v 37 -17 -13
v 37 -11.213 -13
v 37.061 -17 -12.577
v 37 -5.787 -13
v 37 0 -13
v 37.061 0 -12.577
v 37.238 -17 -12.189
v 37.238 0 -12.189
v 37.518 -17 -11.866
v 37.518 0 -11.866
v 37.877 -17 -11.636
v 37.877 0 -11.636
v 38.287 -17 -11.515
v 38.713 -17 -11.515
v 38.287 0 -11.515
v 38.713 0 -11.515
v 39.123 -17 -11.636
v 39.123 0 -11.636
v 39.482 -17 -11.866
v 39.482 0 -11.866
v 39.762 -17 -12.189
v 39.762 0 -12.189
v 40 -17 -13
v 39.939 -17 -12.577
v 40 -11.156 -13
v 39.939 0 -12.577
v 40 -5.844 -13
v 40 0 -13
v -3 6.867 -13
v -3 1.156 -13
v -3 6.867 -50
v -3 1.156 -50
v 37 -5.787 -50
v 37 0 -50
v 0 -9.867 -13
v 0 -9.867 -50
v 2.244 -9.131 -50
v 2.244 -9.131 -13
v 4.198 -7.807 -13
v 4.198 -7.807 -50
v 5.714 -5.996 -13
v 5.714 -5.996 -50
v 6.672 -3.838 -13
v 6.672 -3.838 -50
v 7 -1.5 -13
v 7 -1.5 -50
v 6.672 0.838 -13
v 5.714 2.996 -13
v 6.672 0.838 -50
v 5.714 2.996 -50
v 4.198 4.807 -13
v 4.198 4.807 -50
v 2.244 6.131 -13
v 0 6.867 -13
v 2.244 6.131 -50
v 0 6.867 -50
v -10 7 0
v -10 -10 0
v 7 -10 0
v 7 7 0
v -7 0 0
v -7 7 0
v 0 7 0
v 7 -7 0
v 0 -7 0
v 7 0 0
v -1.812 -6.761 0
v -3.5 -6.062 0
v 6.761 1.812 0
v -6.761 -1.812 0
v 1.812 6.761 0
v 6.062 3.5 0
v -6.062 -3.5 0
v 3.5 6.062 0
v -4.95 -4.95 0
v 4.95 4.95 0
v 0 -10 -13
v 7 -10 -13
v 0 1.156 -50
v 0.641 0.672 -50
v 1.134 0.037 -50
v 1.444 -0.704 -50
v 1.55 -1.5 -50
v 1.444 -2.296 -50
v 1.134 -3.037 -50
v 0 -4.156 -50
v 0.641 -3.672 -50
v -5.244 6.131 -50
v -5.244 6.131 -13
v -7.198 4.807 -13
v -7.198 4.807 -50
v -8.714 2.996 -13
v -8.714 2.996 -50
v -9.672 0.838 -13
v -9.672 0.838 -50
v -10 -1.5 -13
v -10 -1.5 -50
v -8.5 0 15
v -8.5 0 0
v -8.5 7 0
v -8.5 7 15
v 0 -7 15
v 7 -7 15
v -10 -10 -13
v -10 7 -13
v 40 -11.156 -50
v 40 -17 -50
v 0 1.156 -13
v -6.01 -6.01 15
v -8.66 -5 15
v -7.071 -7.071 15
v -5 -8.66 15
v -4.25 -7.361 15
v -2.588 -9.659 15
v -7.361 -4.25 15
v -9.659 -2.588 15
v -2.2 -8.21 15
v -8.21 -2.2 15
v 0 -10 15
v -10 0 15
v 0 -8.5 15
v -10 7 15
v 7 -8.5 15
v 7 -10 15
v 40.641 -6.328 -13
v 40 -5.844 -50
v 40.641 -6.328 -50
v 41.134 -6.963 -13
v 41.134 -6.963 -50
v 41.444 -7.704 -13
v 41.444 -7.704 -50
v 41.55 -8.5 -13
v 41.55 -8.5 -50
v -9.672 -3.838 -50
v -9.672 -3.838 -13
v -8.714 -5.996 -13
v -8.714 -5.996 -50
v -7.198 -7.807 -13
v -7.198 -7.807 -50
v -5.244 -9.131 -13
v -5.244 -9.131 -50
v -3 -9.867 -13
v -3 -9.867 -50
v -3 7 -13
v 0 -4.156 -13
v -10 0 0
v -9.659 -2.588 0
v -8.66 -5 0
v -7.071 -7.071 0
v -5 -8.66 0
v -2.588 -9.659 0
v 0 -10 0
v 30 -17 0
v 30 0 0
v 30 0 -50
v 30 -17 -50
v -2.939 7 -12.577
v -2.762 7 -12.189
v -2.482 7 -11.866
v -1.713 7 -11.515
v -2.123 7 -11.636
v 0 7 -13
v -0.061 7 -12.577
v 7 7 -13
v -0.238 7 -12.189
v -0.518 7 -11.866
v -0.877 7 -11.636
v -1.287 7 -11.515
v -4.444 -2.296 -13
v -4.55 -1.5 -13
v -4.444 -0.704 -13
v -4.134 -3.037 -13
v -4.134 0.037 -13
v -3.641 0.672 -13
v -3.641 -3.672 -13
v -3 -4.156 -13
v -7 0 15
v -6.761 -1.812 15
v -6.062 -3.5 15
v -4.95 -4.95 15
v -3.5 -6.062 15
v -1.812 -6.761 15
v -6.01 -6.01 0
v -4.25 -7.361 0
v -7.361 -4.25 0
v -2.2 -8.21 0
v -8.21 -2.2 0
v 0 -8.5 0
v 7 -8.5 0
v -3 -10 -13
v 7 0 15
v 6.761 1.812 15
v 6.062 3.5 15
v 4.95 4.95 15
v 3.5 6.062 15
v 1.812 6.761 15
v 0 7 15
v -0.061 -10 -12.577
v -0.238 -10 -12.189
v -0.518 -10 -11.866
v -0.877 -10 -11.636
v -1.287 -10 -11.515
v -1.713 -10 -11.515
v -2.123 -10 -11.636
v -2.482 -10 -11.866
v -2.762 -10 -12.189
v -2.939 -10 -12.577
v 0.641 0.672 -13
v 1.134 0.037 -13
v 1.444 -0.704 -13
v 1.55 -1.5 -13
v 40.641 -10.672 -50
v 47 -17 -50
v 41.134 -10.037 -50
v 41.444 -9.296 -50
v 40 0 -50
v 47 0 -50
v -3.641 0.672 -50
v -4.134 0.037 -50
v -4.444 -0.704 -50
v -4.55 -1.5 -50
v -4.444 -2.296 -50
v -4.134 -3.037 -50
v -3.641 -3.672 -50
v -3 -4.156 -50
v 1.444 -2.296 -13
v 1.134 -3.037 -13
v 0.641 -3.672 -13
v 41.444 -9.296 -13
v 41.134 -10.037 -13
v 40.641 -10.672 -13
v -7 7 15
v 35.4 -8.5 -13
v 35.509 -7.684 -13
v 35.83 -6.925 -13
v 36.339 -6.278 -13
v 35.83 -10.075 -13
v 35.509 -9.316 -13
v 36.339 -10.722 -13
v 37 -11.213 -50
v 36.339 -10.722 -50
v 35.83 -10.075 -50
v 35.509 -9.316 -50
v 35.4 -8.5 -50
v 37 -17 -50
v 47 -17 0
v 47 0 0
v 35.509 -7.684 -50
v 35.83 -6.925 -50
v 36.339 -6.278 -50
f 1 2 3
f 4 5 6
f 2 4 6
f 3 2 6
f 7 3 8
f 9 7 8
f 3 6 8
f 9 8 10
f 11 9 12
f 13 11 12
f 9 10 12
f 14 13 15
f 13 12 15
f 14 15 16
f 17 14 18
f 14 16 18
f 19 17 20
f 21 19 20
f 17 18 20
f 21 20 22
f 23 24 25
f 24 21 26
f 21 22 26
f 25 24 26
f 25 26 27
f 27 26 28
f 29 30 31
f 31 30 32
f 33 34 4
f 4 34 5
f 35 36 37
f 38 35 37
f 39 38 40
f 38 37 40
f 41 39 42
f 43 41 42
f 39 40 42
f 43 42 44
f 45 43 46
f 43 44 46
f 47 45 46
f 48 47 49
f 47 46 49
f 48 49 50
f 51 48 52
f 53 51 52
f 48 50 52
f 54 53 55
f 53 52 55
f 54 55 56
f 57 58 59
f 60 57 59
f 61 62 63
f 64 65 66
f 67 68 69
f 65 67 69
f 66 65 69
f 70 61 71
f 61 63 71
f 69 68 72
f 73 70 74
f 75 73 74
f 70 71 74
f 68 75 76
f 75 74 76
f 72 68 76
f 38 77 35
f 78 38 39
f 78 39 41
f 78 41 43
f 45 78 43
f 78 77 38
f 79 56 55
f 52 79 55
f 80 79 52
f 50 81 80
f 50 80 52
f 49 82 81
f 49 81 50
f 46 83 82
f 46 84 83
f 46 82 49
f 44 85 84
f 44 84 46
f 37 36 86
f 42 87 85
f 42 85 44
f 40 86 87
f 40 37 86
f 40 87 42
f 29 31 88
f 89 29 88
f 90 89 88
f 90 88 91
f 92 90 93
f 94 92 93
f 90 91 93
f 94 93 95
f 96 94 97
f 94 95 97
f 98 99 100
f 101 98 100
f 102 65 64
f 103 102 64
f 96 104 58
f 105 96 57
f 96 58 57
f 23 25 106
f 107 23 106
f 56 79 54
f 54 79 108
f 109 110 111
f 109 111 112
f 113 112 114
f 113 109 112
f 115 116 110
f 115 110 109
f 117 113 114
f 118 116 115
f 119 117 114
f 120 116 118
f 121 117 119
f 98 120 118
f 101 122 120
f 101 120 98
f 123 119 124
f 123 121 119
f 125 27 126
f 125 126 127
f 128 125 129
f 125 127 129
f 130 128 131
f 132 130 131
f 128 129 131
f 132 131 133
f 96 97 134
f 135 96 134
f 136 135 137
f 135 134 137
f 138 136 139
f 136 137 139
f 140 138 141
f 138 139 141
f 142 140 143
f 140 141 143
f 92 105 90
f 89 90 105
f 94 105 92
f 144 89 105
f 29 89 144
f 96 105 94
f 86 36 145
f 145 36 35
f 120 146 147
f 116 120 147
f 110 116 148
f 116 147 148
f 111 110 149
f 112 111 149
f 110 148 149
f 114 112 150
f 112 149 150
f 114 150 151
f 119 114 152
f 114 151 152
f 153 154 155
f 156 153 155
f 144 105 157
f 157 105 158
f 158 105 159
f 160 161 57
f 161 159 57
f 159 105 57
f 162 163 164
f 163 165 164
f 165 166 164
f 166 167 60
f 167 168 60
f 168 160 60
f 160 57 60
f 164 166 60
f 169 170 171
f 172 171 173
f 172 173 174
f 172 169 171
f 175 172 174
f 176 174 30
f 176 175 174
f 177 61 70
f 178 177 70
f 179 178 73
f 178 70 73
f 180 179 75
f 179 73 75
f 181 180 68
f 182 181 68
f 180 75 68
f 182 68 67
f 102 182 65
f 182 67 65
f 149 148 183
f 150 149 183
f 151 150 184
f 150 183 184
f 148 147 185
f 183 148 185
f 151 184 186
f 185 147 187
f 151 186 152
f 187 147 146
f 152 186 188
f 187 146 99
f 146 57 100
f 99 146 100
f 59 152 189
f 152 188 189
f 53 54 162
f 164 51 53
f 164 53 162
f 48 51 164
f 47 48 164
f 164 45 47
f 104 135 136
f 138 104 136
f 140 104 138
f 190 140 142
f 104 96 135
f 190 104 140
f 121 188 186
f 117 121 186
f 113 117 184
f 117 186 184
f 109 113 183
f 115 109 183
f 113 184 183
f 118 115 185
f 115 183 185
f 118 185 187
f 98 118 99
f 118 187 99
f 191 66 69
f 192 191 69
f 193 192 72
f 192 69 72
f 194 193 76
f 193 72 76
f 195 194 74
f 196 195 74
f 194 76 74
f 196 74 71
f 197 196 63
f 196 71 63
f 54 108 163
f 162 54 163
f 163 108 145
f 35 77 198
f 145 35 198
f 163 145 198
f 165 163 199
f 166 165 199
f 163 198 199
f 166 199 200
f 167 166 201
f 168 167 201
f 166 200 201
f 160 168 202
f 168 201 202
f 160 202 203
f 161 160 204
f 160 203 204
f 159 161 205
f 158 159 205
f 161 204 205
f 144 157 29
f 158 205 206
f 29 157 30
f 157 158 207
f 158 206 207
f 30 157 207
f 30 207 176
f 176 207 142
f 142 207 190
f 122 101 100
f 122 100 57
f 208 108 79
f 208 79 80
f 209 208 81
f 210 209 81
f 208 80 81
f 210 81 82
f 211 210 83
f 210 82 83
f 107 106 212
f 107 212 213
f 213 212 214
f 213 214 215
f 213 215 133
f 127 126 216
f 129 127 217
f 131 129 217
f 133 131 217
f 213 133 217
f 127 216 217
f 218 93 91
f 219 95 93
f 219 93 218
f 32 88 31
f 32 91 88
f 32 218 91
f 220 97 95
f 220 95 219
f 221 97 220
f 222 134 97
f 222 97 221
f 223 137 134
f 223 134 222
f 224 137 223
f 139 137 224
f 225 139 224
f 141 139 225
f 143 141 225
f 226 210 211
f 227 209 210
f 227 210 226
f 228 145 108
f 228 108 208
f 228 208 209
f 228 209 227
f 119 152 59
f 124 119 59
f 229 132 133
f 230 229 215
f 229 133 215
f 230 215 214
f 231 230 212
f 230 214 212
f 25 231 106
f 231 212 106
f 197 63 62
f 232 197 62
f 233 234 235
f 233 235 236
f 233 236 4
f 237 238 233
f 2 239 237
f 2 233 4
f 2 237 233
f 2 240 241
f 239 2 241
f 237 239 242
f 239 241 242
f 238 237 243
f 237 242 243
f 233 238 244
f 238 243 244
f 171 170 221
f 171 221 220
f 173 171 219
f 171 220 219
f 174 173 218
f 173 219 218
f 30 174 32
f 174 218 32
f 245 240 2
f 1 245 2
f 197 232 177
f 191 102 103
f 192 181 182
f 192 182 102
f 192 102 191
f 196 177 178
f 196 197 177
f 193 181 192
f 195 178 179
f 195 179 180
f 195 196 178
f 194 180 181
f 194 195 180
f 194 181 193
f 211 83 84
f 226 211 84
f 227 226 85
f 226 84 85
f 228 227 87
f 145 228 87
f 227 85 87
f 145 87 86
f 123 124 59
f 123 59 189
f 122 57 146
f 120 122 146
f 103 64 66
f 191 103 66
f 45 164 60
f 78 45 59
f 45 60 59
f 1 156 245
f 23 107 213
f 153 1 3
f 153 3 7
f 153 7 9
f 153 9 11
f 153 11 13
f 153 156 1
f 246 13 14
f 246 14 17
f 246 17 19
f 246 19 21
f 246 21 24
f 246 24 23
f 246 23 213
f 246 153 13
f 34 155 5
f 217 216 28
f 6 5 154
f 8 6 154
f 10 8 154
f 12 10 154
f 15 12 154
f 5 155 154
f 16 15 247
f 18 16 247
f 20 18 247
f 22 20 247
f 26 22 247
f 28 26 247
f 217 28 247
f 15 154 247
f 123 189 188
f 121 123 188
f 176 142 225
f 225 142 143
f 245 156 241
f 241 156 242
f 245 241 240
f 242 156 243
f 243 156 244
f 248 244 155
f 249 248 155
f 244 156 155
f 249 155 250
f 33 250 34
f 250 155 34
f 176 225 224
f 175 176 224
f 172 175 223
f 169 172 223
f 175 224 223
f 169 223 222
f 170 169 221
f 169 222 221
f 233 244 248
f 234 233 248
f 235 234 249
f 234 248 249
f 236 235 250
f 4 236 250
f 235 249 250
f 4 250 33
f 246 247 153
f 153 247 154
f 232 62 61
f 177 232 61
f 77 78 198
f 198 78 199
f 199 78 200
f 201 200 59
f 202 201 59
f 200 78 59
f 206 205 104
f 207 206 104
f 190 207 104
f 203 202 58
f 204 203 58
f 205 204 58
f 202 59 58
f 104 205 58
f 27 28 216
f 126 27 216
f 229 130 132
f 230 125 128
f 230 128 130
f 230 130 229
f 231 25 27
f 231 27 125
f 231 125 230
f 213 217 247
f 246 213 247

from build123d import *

# Parameters (mm, degrees)
F1_DEPTH  = 15
F3_DEPTH  = 17
F5_DEPTH  = 37
F7_DEPTH  = 37
F9_DEPTH  = 50
F11_DEPTH = 17
F13_DEPTH = 37
F15_DEPTH = 37
F17_DEPTH = 37
F19_DEPTH = 37


with BuildPart() as f1:
    # F0 (on Top) → F1 (new body)
    with BuildSketch(Plane.XY):
        with BuildLine():
            Line((0, -10), (7, -10))
            Line((7, -10), (7, -8.5))
            Line((7, -8.5), (0, -8.5))
            ThreePointArc((0, -8.5), (-6.0104076401, -6.0104076401), (-8.5, 0))
            Line((-8.5, 0), (-8.5, 7))
            Line((-8.5, 7), (-10, 7))
            Line((-10, 7), (-10, 0))
            ThreePointArc((-10, 0), (-7.0710678119, -7.0710678119), (0, -10))
        make_face()
    extrude(amount=F1_DEPTH)


with BuildPart() as f1b:
    # F0 (on Top) → F1, piece 2 (new body)
    with BuildSketch(Plane.XY):
        with BuildLine():
            Line((0, -7), (7, -7))
            Line((7, -7), (7, 0))
            ThreePointArc((7, 0), (4.9497474683, 4.9497474683), (0, 7))
            Line((0, 7), (-7, 7))
            Line((-7, 7), (-7, 0))
            ThreePointArc((-7, 0), (-4.9497474683, -4.9497474683), (0, -7))
        make_face()
    extrude(amount=F1_DEPTH)


with BuildPart() as f3:
    # F2 (on Front) → F3 (new body)
    with BuildSketch(Plane.XZ):
        with BuildLine():
            Line((47, 0), (30, 0))
            Line((30, 0), (30, -50))
            Line((30, -50), (37, -50))
            Line((37, -50), (37, -13))
            ThreePointArc((37, -13), (38.5, -11.5), (40, -13))
            Line((40, -13), (40, -50))
            Line((40, -50), (47, -50))
            Line((47, -50), (47, 0))
        make_face()
    extrude(amount=F3_DEPTH)

    # F4 (on face) → F5 (cut)
    with BuildSketch(Plane(origin=(0, 0, -50), x_dir=(1, 0, 0), z_dir=(0, 0, -1))):
        with BuildLine():
            ThreePointArc((37, 11.2129319933), (35.8297940154, 10.0748015748), (35.4, 8.5))
            Line((35.4, 8.5), (37, 8.5))
            Line((37, 8.5), (37, 11.2129319933))
        make_face()
        with BuildLine():
            Line((37, 8.5), (35.4, 8.5))
            ThreePointArc((35.4, 8.5), (35.8297940154, 6.9251984252), (37, 5.7870680067))
            Line((37, 5.7870680067), (37, 8.5))
        make_face()
    extrude(amount=-F5_DEPTH, mode=Mode.SUBTRACT)

    # F6 (on face) → F7 (cut)
    with BuildSketch(Plane(origin=(0, 0, -50), x_dir=(1, 0, 0), z_dir=(0, 0, -1))):
        with BuildLine():
            Line((40, 8.5), (41.55, 8.5))
            ThreePointArc((41.55, 8.5), (41.134150717, 10.0374491862), (40, 11.155654345))
            Line((40, 11.155654345), (40, 8.5))
        make_face()
        with BuildLine():
            ThreePointArc((40, 5.844345655), (41.134150717, 6.9625508138), (41.55, 8.5))
            Line((41.55, 8.5), (40, 8.5))
            Line((40, 8.5), (40, 5.844345655))
        make_face()
    extrude(amount=-F7_DEPTH, mode=Mode.SUBTRACT)


with BuildPart() as f9:
    # F8 (on face) → F9 (new body)
    with BuildSketch(Plane(origin=(0, 0, 0), x_dir=(1, 0, 0), z_dir=(0, 0, -1))):
        with BuildLine():
            Line((7, -7), (7, 8.5))
            Line((7, 8.5), (0, 8.5))
            ThreePointArc((0, 8.5), (-6.0104076401, 6.0104076401), (-8.5, 0))
            Line((-8.5, 0), (-8.5, -7))
            Line((-8.5, -7), (7, -7))
        make_face()
        with BuildLine():
            ThreePointArc((-10, 0), (-7.0710678119, 7.0710678119), (0, 10))
            Line((0, 10), (-10, 10))
            Line((-10, 10), (-10, 0))
        make_face()
        with BuildLine():
            Line((7, 8.5), (7, 10))
            Line((7, 10), (0, 10))
            ThreePointArc((0, 10), (-7.0710678119, 7.0710678119), (-10, 0))
            Line((-10, 0), (-10, -7))
            Line((-10, -7), (-8.5, -7))
            Line((-8.5, -7), (-8.5, 0))
            ThreePointArc((-8.5, 0), (-6.0104076401, 6.0104076401), (0, 8.5))
            Line((0, 8.5), (7, 8.5))
        make_face()
    extrude(amount=F9_DEPTH)

    # F10 (on face) → F11 (cut)
    with BuildSketch(Plane.XZ.offset(10)):
        with BuildLine():
            Line((-3, -13), (0, -13))
            ThreePointArc((0, -13), (-1.5, -11.5), (-3, -13))
        make_face()
        Polygon((-3, -50), (-1.5, -50), (0, -50), (0, -13), (-3, -13), align=None)
    extrude(amount=-F11_DEPTH, mode=Mode.SUBTRACT)

    # F12 (on face) → F13 (cut)
    with BuildSketch(Plane(origin=(0, 0, -50), x_dir=(1, 0, 0), z_dir=(0, 0, -1))):
        with BuildLine():
            ThreePointArc((-3, 4.155654345), (-4.134150717, 3.0374491862), (-4.55, 1.5))
            Line((-4.55, 1.5), (-3, 1.5))
            Line((-3, 1.5), (-3, 4.155654345))
        make_face()
        with BuildLine():
            Line((-3, 1.5), (-4.55, 1.5))
            ThreePointArc((-4.55, 1.5), (-4.134150717, -0.0374491862), (-3, -1.155654345))
            Line((-3, -1.155654345), (-3, 1.5))
        make_face()
    extrude(amount=-F13_DEPTH, mode=Mode.SUBTRACT)

    # F14 (on face) → F15 (cut)
    with BuildSketch(Plane(origin=(0, 0, -50), x_dir=(1, 0, 0), z_dir=(0, 0, -1))):
        with BuildLine():
            Line((0, 1.5), (1.55, 1.5))
            ThreePointArc((1.55, 1.5), (1.134150717, 3.0374491862), (0, 4.155654345))
            Line((0, 4.155654345), (0, 1.5))
        make_face()
        with BuildLine():
            ThreePointArc((0, -1.155654345), (1.134150717, -0.0374491862), (1.55, 1.5))
            Line((1.55, 1.5), (0, 1.5))
            Line((0, 1.5), (0, -1.155654345))
        make_face()
    extrude(amount=-F15_DEPTH, mode=Mode.SUBTRACT)

    # F16 (on face) → F17 (cut)
    with BuildSketch(Plane(origin=(0, 0, -50), x_dir=(1, 0, 0), z_dir=(0, 0, -1))):
        with BuildLine():
            Line((-10, 10), (-10, 1.5))
            ThreePointArc((-10, 1.5), (-8.0192024052, 6.9543560573), (-3, 9.8666002653))
            Line((-3, 9.8666002653), (-3, 10))
            Line((-3, 10), (-10, 10))
        make_face()
        with BuildLine():
            ThreePointArc((-3, -6.8666002653), (-8.0192024052, -3.9543560573), (-10, 1.5))
            Line((-10, 1.5), (-10, -7))
            Line((-10, -7), (-3, -7))
            Line((-3, -7), (-3, -6.8666002653))
        make_face()
    extrude(amount=-F17_DEPTH, mode=Mode.SUBTRACT)

    # F18 (on face) → F19 (cut)
    with BuildSketch(Plane(origin=(0, 0, -50), x_dir=(1, 0, 0), z_dir=(0, 0, -1))):
        with BuildLine():
            ThreePointArc((0, 9.8666002653), (5.0192024052, 6.9543560573), (7, 1.5))
            Line((7, 1.5), (7, 10))
            Line((7, 10), (0, 10))
            Line((0, 10), (0, 9.8666002653))
        make_face()
        with BuildLine():
            Line((7, -7), (7, 1.5))
            ThreePointArc((7, 1.5), (5.0192024052, -3.9543560573), (0, -6.8666002653))
            Line((0, -6.8666002653), (0, -7))
            Line((0, -7), (7, -7))
        make_face()
    extrude(amount=-F19_DEPTH, mode=Mode.SUBTRACT)


solid = Compound([f1.part, f1b.part, f3.part, f9.part])
